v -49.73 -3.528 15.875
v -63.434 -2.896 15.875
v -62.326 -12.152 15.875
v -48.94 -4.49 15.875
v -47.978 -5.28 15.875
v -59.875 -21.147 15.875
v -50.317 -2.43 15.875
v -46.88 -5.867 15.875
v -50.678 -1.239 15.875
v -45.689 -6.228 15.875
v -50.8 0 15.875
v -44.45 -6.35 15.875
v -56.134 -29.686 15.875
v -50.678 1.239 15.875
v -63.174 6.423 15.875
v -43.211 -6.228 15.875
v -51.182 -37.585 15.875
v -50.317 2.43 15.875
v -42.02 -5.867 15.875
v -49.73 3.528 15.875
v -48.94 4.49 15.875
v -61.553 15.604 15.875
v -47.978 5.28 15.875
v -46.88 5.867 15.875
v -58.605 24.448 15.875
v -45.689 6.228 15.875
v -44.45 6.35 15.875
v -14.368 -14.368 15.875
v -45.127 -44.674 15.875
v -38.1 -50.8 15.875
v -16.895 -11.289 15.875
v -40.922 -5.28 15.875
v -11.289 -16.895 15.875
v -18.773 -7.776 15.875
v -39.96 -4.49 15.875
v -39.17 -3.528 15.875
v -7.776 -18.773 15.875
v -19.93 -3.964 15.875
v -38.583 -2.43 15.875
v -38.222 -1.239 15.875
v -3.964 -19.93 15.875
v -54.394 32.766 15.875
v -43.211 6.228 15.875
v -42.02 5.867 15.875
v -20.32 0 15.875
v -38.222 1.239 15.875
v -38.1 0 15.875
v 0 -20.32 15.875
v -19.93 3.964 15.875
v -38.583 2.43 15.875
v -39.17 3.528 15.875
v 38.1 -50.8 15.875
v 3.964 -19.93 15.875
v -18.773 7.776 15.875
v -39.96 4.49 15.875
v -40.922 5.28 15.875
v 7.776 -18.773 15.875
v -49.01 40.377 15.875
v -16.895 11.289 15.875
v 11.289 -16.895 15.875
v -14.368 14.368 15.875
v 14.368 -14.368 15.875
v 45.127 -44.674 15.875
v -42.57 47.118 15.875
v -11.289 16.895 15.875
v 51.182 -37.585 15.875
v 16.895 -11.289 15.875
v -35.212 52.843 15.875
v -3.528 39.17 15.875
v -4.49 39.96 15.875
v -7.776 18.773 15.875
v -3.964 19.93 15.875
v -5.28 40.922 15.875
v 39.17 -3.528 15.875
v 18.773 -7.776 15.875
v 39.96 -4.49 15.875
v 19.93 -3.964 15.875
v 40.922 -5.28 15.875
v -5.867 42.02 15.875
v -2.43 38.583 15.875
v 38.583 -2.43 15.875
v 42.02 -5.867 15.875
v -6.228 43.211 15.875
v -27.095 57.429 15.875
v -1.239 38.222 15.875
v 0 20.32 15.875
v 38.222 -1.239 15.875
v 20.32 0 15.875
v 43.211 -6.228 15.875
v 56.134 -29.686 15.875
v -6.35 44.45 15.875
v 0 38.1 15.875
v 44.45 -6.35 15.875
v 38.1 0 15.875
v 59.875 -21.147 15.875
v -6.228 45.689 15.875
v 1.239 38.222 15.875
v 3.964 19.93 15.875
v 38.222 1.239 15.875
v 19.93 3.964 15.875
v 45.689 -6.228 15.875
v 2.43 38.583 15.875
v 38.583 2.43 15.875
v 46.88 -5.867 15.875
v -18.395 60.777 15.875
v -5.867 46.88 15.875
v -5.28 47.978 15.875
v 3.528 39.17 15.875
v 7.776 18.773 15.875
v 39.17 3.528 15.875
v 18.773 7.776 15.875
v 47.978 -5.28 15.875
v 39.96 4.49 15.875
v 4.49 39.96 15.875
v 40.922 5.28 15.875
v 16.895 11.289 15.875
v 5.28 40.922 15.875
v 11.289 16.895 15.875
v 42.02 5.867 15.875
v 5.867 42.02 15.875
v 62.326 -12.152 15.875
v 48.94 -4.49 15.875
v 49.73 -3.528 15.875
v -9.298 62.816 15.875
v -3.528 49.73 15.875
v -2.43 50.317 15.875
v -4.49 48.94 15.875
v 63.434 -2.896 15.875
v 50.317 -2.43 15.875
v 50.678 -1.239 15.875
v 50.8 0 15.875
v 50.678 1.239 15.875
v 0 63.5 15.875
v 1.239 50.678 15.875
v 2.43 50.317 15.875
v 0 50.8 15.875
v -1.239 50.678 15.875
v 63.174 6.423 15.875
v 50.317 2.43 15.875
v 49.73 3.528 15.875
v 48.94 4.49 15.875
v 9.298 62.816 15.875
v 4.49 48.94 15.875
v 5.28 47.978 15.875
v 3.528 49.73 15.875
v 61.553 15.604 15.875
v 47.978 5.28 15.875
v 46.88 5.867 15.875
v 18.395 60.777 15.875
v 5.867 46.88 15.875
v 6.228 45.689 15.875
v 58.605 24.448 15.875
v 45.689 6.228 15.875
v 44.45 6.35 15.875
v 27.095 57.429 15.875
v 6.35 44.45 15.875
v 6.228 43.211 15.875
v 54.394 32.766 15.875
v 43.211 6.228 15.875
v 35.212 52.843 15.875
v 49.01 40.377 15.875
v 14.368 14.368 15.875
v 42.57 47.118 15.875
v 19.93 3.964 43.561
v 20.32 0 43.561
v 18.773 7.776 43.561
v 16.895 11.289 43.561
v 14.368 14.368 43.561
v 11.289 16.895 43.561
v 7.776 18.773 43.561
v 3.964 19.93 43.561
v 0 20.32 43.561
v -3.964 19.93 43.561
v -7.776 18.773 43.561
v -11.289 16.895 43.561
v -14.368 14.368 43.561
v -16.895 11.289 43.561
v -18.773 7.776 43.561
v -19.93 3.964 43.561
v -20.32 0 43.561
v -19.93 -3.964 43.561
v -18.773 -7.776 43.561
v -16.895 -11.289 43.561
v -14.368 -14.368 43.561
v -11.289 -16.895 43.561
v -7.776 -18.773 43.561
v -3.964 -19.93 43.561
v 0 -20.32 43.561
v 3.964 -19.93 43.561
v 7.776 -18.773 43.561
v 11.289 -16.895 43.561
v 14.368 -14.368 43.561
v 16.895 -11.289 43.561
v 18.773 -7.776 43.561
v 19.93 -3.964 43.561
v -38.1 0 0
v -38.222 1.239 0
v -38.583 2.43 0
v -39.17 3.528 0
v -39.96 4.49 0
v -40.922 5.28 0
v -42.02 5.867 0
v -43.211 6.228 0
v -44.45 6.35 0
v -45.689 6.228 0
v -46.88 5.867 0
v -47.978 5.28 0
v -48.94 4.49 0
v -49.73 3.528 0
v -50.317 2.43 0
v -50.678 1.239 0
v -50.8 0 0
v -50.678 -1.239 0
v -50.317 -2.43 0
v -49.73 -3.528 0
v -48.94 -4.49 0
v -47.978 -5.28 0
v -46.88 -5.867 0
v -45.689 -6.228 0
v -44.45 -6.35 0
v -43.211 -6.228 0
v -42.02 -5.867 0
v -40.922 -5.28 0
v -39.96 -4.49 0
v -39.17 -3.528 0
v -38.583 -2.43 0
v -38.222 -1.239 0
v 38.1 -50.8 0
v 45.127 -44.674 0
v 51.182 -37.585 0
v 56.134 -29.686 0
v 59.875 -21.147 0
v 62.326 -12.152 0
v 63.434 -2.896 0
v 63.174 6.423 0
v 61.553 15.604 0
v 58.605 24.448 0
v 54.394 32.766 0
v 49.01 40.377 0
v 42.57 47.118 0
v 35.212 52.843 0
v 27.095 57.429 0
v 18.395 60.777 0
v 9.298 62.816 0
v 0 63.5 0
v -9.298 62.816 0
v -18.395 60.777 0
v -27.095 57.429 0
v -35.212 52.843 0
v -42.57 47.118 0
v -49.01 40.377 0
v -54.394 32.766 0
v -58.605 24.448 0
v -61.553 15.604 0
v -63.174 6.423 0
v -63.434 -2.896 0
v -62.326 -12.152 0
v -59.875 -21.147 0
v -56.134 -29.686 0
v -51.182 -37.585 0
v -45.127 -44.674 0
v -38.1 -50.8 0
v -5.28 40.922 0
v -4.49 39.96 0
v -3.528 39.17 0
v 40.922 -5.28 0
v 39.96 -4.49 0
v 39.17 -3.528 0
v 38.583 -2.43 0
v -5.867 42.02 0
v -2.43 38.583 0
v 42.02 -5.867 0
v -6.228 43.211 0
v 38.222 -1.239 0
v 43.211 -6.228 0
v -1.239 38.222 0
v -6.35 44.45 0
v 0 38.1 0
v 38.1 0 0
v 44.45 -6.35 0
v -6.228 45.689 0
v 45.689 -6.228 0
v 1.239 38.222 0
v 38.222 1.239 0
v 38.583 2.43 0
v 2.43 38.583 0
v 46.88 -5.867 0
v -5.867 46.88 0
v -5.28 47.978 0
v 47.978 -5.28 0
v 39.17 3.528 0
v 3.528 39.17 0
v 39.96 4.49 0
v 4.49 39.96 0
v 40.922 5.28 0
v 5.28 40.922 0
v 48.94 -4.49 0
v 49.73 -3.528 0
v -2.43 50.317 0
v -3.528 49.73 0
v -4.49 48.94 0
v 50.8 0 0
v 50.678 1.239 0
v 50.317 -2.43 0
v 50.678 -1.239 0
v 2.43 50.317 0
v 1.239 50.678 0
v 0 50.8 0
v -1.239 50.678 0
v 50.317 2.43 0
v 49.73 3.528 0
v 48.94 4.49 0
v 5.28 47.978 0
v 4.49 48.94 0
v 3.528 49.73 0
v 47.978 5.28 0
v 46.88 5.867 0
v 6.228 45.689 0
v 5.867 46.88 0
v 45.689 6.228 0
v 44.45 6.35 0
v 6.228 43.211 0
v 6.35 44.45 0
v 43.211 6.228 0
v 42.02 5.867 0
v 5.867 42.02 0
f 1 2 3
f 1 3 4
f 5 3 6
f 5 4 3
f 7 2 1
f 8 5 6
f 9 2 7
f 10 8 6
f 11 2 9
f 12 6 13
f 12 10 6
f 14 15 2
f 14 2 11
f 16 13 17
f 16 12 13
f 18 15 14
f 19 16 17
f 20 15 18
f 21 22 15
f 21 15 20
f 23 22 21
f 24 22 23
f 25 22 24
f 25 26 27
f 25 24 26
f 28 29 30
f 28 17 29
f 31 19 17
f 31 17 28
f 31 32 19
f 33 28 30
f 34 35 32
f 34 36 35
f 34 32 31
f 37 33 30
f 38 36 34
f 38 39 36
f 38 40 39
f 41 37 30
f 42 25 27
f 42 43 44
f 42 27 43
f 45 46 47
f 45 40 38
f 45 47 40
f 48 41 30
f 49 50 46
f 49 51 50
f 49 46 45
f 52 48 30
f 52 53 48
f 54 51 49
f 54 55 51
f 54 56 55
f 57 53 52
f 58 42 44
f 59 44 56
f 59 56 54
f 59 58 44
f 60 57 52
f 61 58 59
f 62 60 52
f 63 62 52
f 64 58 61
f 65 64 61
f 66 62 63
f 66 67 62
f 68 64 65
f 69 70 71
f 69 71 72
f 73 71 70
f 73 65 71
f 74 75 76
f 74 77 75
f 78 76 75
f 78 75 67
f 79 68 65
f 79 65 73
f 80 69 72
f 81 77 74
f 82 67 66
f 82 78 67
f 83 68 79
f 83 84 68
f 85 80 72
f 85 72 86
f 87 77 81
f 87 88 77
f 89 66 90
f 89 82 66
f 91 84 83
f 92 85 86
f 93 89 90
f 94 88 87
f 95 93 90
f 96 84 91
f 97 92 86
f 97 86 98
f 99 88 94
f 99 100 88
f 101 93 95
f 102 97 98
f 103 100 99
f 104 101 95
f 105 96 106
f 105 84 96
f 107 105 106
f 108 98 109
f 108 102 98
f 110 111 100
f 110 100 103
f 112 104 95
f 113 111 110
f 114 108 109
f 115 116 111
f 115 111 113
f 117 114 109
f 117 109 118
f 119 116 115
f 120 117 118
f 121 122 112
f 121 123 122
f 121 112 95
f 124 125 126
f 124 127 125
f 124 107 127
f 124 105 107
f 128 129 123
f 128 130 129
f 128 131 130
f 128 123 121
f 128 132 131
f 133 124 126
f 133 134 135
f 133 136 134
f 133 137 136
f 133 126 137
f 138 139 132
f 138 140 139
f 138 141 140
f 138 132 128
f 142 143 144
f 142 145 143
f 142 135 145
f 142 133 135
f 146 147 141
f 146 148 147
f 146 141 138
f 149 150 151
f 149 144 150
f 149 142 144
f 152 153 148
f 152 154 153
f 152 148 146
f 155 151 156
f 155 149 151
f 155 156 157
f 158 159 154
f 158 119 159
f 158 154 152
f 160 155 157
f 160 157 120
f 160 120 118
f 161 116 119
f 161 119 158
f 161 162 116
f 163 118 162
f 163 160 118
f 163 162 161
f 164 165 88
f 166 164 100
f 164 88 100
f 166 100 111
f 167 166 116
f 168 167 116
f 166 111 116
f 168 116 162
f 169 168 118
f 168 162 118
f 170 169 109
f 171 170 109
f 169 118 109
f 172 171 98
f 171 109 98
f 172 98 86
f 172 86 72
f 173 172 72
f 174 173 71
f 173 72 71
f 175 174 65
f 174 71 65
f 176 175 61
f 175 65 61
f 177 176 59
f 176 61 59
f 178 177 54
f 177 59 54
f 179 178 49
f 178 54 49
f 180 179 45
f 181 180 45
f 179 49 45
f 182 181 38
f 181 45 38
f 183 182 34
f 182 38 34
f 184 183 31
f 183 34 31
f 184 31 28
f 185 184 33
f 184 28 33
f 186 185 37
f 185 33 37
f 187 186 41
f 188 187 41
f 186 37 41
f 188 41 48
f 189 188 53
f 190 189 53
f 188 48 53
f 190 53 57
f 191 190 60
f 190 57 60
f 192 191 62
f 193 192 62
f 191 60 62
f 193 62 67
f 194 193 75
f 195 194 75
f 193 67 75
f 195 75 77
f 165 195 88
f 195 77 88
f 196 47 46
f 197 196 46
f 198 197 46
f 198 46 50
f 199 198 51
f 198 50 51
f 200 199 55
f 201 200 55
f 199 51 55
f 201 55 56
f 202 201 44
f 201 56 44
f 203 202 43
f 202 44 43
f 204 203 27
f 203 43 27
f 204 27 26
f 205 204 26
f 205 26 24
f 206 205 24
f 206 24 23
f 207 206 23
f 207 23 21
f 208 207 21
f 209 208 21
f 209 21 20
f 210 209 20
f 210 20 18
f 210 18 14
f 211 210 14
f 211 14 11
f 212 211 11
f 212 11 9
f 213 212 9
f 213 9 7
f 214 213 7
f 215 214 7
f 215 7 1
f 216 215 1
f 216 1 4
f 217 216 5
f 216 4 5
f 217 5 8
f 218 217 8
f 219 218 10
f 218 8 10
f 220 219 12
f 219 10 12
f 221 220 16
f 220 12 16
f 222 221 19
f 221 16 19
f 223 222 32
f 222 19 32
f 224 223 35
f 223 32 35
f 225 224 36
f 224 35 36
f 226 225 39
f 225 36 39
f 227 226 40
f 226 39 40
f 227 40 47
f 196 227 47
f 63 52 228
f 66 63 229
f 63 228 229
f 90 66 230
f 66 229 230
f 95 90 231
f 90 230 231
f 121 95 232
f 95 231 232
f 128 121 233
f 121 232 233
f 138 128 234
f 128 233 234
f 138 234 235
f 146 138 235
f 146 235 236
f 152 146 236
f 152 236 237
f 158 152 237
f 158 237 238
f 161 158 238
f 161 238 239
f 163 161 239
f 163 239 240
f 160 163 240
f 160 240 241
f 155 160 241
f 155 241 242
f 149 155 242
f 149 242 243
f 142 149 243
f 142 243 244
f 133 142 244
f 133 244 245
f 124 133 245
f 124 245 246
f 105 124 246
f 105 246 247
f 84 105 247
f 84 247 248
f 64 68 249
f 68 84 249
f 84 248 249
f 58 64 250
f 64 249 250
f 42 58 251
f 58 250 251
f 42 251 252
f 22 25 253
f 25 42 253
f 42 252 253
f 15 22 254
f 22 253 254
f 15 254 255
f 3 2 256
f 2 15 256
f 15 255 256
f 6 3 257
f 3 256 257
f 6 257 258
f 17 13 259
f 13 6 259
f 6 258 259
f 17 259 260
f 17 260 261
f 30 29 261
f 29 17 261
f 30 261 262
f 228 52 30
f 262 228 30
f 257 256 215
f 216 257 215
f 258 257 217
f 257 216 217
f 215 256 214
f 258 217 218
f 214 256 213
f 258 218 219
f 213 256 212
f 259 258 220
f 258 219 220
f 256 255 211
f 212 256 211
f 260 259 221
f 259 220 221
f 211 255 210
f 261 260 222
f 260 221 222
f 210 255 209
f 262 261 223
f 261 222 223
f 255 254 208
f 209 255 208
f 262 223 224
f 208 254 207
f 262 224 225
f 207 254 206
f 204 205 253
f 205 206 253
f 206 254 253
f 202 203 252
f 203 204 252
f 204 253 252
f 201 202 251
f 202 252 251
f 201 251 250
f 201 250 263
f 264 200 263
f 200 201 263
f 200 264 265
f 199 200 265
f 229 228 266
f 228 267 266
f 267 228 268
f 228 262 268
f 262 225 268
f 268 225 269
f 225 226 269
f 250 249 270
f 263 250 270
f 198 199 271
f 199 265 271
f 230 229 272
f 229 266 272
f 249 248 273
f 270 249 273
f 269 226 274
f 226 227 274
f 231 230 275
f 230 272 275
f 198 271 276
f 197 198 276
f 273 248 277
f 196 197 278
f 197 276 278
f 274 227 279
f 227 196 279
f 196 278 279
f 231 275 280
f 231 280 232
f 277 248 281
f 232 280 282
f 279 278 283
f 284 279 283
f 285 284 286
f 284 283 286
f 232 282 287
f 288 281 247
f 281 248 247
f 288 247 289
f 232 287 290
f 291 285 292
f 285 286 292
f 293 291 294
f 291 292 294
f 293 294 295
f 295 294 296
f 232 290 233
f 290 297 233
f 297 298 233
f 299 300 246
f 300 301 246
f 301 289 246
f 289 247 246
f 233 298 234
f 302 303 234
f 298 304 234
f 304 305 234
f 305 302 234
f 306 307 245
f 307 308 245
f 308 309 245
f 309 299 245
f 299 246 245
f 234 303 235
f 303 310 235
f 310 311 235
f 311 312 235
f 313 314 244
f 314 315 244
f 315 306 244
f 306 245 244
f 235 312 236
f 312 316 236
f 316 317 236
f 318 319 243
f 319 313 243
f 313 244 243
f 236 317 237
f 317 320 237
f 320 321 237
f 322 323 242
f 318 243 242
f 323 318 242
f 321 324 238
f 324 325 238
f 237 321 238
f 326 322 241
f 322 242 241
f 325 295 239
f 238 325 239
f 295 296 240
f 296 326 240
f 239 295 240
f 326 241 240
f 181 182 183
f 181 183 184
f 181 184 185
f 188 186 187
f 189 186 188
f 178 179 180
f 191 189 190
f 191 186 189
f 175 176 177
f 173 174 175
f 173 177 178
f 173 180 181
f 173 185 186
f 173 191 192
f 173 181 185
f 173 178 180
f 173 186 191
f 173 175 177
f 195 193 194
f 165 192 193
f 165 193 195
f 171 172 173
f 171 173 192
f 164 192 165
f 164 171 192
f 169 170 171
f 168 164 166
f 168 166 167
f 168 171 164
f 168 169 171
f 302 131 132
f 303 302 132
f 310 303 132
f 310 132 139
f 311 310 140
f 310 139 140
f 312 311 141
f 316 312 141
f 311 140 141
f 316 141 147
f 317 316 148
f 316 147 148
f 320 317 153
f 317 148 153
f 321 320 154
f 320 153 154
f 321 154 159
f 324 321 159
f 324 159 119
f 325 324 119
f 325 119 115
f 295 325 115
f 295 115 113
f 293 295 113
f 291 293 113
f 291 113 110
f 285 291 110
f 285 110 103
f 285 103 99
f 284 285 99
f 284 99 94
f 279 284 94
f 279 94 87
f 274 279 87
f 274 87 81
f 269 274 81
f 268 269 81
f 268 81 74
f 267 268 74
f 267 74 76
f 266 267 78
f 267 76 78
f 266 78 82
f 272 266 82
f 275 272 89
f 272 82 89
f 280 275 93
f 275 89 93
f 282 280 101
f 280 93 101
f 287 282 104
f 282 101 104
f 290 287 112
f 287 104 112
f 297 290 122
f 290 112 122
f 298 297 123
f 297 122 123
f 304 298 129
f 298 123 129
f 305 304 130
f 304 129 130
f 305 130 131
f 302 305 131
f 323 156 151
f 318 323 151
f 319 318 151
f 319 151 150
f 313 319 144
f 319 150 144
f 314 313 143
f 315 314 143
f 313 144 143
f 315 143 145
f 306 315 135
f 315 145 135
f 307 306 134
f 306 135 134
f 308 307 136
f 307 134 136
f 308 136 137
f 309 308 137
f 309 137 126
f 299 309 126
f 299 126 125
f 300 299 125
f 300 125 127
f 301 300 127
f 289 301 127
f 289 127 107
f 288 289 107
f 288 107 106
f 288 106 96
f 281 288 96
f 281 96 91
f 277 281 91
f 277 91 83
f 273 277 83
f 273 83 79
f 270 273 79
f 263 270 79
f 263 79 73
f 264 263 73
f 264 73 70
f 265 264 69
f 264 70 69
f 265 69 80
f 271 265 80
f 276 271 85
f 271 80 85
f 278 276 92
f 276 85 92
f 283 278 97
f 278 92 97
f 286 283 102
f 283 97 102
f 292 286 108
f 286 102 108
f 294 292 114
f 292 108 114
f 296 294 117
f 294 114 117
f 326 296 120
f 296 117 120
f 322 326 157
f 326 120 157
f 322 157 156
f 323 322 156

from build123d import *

# Parameters (mm, degrees)
F0_R      = 63.5
F1_DEPTH  = 15.875
F3_DEPTH  = 25.4
F6_R      = 6.35
F7_DEPTH  = 25.4
F8_R      = 20.32
F9_DEPTH  = 27.94
F11_R     = 20.32
F12_DEPTH = 27.686


with BuildPart() as f1:
    # F0 (on Top) → F1 (new body)
    with BuildSketch(Plane.XY):
        Circle(F0_R)
    extrude(amount=F1_DEPTH)

    # F2 (on face) → F3 (cut)
    with BuildSketch(Plane.XY.offset(15.875)):
        with BuildLine():
            Line((38.1, -50.8), (-38.1, -50.8))
            ThreePointArc((-38.1, -50.8), (0, -63.5), (38.1, -50.8))
        make_face()
    extrude(amount=-F3_DEPTH, mode=Mode.SUBTRACT)


with BuildPart() as f4_1:
    # F4: copy of F1
    add(f1.part)


with BuildPart() as f5_1:
    # F5: copy of F1
    add(f1.part)


with BuildPart() as f7_tool:
    # F6 (on face) → F7 (new body)
    with BuildSketch(Plane.XY.offset(15.875)):
        with Locations((44.45, 0)):
            Circle(F6_R)
        with Locations((0, 44.45)):
            Circle(F6_R)
        with Locations((-44.45, 0)):
            Circle(F6_R)
    extrude(amount=-F7_DEPTH)


with BuildPart() as f1_1:
    add(f1.part)

    # F7: cut by f7_tool
    add(f7_tool.part, mode=Mode.SUBTRACT)

    # F11 (on face) → F12 (join)
    with BuildSketch(Plane.XY.offset(15.875)):
        Circle(F11_R)
    extrude(amount=F12_DEPTH)


with BuildPart() as f4_1_1:
    add(f4_1.part)

    # F7: cut by f7_tool
    add(f7_tool.part, mode=Mode.SUBTRACT)


with BuildPart() as f5_1_1:
    add(f5_1.part)

    # F7: cut by f7_tool
    add(f7_tool.part, mode=Mode.SUBTRACT)


with BuildPart() as f9:
    # F8 (on face) → F9 (new body)
    with BuildSketch(Plane.XY.offset(15.875)):
        with Locations((0, 3.125413)):
            Circle(F8_R)
    extrude(amount=F9_DEPTH)


solid = f1_1.part
